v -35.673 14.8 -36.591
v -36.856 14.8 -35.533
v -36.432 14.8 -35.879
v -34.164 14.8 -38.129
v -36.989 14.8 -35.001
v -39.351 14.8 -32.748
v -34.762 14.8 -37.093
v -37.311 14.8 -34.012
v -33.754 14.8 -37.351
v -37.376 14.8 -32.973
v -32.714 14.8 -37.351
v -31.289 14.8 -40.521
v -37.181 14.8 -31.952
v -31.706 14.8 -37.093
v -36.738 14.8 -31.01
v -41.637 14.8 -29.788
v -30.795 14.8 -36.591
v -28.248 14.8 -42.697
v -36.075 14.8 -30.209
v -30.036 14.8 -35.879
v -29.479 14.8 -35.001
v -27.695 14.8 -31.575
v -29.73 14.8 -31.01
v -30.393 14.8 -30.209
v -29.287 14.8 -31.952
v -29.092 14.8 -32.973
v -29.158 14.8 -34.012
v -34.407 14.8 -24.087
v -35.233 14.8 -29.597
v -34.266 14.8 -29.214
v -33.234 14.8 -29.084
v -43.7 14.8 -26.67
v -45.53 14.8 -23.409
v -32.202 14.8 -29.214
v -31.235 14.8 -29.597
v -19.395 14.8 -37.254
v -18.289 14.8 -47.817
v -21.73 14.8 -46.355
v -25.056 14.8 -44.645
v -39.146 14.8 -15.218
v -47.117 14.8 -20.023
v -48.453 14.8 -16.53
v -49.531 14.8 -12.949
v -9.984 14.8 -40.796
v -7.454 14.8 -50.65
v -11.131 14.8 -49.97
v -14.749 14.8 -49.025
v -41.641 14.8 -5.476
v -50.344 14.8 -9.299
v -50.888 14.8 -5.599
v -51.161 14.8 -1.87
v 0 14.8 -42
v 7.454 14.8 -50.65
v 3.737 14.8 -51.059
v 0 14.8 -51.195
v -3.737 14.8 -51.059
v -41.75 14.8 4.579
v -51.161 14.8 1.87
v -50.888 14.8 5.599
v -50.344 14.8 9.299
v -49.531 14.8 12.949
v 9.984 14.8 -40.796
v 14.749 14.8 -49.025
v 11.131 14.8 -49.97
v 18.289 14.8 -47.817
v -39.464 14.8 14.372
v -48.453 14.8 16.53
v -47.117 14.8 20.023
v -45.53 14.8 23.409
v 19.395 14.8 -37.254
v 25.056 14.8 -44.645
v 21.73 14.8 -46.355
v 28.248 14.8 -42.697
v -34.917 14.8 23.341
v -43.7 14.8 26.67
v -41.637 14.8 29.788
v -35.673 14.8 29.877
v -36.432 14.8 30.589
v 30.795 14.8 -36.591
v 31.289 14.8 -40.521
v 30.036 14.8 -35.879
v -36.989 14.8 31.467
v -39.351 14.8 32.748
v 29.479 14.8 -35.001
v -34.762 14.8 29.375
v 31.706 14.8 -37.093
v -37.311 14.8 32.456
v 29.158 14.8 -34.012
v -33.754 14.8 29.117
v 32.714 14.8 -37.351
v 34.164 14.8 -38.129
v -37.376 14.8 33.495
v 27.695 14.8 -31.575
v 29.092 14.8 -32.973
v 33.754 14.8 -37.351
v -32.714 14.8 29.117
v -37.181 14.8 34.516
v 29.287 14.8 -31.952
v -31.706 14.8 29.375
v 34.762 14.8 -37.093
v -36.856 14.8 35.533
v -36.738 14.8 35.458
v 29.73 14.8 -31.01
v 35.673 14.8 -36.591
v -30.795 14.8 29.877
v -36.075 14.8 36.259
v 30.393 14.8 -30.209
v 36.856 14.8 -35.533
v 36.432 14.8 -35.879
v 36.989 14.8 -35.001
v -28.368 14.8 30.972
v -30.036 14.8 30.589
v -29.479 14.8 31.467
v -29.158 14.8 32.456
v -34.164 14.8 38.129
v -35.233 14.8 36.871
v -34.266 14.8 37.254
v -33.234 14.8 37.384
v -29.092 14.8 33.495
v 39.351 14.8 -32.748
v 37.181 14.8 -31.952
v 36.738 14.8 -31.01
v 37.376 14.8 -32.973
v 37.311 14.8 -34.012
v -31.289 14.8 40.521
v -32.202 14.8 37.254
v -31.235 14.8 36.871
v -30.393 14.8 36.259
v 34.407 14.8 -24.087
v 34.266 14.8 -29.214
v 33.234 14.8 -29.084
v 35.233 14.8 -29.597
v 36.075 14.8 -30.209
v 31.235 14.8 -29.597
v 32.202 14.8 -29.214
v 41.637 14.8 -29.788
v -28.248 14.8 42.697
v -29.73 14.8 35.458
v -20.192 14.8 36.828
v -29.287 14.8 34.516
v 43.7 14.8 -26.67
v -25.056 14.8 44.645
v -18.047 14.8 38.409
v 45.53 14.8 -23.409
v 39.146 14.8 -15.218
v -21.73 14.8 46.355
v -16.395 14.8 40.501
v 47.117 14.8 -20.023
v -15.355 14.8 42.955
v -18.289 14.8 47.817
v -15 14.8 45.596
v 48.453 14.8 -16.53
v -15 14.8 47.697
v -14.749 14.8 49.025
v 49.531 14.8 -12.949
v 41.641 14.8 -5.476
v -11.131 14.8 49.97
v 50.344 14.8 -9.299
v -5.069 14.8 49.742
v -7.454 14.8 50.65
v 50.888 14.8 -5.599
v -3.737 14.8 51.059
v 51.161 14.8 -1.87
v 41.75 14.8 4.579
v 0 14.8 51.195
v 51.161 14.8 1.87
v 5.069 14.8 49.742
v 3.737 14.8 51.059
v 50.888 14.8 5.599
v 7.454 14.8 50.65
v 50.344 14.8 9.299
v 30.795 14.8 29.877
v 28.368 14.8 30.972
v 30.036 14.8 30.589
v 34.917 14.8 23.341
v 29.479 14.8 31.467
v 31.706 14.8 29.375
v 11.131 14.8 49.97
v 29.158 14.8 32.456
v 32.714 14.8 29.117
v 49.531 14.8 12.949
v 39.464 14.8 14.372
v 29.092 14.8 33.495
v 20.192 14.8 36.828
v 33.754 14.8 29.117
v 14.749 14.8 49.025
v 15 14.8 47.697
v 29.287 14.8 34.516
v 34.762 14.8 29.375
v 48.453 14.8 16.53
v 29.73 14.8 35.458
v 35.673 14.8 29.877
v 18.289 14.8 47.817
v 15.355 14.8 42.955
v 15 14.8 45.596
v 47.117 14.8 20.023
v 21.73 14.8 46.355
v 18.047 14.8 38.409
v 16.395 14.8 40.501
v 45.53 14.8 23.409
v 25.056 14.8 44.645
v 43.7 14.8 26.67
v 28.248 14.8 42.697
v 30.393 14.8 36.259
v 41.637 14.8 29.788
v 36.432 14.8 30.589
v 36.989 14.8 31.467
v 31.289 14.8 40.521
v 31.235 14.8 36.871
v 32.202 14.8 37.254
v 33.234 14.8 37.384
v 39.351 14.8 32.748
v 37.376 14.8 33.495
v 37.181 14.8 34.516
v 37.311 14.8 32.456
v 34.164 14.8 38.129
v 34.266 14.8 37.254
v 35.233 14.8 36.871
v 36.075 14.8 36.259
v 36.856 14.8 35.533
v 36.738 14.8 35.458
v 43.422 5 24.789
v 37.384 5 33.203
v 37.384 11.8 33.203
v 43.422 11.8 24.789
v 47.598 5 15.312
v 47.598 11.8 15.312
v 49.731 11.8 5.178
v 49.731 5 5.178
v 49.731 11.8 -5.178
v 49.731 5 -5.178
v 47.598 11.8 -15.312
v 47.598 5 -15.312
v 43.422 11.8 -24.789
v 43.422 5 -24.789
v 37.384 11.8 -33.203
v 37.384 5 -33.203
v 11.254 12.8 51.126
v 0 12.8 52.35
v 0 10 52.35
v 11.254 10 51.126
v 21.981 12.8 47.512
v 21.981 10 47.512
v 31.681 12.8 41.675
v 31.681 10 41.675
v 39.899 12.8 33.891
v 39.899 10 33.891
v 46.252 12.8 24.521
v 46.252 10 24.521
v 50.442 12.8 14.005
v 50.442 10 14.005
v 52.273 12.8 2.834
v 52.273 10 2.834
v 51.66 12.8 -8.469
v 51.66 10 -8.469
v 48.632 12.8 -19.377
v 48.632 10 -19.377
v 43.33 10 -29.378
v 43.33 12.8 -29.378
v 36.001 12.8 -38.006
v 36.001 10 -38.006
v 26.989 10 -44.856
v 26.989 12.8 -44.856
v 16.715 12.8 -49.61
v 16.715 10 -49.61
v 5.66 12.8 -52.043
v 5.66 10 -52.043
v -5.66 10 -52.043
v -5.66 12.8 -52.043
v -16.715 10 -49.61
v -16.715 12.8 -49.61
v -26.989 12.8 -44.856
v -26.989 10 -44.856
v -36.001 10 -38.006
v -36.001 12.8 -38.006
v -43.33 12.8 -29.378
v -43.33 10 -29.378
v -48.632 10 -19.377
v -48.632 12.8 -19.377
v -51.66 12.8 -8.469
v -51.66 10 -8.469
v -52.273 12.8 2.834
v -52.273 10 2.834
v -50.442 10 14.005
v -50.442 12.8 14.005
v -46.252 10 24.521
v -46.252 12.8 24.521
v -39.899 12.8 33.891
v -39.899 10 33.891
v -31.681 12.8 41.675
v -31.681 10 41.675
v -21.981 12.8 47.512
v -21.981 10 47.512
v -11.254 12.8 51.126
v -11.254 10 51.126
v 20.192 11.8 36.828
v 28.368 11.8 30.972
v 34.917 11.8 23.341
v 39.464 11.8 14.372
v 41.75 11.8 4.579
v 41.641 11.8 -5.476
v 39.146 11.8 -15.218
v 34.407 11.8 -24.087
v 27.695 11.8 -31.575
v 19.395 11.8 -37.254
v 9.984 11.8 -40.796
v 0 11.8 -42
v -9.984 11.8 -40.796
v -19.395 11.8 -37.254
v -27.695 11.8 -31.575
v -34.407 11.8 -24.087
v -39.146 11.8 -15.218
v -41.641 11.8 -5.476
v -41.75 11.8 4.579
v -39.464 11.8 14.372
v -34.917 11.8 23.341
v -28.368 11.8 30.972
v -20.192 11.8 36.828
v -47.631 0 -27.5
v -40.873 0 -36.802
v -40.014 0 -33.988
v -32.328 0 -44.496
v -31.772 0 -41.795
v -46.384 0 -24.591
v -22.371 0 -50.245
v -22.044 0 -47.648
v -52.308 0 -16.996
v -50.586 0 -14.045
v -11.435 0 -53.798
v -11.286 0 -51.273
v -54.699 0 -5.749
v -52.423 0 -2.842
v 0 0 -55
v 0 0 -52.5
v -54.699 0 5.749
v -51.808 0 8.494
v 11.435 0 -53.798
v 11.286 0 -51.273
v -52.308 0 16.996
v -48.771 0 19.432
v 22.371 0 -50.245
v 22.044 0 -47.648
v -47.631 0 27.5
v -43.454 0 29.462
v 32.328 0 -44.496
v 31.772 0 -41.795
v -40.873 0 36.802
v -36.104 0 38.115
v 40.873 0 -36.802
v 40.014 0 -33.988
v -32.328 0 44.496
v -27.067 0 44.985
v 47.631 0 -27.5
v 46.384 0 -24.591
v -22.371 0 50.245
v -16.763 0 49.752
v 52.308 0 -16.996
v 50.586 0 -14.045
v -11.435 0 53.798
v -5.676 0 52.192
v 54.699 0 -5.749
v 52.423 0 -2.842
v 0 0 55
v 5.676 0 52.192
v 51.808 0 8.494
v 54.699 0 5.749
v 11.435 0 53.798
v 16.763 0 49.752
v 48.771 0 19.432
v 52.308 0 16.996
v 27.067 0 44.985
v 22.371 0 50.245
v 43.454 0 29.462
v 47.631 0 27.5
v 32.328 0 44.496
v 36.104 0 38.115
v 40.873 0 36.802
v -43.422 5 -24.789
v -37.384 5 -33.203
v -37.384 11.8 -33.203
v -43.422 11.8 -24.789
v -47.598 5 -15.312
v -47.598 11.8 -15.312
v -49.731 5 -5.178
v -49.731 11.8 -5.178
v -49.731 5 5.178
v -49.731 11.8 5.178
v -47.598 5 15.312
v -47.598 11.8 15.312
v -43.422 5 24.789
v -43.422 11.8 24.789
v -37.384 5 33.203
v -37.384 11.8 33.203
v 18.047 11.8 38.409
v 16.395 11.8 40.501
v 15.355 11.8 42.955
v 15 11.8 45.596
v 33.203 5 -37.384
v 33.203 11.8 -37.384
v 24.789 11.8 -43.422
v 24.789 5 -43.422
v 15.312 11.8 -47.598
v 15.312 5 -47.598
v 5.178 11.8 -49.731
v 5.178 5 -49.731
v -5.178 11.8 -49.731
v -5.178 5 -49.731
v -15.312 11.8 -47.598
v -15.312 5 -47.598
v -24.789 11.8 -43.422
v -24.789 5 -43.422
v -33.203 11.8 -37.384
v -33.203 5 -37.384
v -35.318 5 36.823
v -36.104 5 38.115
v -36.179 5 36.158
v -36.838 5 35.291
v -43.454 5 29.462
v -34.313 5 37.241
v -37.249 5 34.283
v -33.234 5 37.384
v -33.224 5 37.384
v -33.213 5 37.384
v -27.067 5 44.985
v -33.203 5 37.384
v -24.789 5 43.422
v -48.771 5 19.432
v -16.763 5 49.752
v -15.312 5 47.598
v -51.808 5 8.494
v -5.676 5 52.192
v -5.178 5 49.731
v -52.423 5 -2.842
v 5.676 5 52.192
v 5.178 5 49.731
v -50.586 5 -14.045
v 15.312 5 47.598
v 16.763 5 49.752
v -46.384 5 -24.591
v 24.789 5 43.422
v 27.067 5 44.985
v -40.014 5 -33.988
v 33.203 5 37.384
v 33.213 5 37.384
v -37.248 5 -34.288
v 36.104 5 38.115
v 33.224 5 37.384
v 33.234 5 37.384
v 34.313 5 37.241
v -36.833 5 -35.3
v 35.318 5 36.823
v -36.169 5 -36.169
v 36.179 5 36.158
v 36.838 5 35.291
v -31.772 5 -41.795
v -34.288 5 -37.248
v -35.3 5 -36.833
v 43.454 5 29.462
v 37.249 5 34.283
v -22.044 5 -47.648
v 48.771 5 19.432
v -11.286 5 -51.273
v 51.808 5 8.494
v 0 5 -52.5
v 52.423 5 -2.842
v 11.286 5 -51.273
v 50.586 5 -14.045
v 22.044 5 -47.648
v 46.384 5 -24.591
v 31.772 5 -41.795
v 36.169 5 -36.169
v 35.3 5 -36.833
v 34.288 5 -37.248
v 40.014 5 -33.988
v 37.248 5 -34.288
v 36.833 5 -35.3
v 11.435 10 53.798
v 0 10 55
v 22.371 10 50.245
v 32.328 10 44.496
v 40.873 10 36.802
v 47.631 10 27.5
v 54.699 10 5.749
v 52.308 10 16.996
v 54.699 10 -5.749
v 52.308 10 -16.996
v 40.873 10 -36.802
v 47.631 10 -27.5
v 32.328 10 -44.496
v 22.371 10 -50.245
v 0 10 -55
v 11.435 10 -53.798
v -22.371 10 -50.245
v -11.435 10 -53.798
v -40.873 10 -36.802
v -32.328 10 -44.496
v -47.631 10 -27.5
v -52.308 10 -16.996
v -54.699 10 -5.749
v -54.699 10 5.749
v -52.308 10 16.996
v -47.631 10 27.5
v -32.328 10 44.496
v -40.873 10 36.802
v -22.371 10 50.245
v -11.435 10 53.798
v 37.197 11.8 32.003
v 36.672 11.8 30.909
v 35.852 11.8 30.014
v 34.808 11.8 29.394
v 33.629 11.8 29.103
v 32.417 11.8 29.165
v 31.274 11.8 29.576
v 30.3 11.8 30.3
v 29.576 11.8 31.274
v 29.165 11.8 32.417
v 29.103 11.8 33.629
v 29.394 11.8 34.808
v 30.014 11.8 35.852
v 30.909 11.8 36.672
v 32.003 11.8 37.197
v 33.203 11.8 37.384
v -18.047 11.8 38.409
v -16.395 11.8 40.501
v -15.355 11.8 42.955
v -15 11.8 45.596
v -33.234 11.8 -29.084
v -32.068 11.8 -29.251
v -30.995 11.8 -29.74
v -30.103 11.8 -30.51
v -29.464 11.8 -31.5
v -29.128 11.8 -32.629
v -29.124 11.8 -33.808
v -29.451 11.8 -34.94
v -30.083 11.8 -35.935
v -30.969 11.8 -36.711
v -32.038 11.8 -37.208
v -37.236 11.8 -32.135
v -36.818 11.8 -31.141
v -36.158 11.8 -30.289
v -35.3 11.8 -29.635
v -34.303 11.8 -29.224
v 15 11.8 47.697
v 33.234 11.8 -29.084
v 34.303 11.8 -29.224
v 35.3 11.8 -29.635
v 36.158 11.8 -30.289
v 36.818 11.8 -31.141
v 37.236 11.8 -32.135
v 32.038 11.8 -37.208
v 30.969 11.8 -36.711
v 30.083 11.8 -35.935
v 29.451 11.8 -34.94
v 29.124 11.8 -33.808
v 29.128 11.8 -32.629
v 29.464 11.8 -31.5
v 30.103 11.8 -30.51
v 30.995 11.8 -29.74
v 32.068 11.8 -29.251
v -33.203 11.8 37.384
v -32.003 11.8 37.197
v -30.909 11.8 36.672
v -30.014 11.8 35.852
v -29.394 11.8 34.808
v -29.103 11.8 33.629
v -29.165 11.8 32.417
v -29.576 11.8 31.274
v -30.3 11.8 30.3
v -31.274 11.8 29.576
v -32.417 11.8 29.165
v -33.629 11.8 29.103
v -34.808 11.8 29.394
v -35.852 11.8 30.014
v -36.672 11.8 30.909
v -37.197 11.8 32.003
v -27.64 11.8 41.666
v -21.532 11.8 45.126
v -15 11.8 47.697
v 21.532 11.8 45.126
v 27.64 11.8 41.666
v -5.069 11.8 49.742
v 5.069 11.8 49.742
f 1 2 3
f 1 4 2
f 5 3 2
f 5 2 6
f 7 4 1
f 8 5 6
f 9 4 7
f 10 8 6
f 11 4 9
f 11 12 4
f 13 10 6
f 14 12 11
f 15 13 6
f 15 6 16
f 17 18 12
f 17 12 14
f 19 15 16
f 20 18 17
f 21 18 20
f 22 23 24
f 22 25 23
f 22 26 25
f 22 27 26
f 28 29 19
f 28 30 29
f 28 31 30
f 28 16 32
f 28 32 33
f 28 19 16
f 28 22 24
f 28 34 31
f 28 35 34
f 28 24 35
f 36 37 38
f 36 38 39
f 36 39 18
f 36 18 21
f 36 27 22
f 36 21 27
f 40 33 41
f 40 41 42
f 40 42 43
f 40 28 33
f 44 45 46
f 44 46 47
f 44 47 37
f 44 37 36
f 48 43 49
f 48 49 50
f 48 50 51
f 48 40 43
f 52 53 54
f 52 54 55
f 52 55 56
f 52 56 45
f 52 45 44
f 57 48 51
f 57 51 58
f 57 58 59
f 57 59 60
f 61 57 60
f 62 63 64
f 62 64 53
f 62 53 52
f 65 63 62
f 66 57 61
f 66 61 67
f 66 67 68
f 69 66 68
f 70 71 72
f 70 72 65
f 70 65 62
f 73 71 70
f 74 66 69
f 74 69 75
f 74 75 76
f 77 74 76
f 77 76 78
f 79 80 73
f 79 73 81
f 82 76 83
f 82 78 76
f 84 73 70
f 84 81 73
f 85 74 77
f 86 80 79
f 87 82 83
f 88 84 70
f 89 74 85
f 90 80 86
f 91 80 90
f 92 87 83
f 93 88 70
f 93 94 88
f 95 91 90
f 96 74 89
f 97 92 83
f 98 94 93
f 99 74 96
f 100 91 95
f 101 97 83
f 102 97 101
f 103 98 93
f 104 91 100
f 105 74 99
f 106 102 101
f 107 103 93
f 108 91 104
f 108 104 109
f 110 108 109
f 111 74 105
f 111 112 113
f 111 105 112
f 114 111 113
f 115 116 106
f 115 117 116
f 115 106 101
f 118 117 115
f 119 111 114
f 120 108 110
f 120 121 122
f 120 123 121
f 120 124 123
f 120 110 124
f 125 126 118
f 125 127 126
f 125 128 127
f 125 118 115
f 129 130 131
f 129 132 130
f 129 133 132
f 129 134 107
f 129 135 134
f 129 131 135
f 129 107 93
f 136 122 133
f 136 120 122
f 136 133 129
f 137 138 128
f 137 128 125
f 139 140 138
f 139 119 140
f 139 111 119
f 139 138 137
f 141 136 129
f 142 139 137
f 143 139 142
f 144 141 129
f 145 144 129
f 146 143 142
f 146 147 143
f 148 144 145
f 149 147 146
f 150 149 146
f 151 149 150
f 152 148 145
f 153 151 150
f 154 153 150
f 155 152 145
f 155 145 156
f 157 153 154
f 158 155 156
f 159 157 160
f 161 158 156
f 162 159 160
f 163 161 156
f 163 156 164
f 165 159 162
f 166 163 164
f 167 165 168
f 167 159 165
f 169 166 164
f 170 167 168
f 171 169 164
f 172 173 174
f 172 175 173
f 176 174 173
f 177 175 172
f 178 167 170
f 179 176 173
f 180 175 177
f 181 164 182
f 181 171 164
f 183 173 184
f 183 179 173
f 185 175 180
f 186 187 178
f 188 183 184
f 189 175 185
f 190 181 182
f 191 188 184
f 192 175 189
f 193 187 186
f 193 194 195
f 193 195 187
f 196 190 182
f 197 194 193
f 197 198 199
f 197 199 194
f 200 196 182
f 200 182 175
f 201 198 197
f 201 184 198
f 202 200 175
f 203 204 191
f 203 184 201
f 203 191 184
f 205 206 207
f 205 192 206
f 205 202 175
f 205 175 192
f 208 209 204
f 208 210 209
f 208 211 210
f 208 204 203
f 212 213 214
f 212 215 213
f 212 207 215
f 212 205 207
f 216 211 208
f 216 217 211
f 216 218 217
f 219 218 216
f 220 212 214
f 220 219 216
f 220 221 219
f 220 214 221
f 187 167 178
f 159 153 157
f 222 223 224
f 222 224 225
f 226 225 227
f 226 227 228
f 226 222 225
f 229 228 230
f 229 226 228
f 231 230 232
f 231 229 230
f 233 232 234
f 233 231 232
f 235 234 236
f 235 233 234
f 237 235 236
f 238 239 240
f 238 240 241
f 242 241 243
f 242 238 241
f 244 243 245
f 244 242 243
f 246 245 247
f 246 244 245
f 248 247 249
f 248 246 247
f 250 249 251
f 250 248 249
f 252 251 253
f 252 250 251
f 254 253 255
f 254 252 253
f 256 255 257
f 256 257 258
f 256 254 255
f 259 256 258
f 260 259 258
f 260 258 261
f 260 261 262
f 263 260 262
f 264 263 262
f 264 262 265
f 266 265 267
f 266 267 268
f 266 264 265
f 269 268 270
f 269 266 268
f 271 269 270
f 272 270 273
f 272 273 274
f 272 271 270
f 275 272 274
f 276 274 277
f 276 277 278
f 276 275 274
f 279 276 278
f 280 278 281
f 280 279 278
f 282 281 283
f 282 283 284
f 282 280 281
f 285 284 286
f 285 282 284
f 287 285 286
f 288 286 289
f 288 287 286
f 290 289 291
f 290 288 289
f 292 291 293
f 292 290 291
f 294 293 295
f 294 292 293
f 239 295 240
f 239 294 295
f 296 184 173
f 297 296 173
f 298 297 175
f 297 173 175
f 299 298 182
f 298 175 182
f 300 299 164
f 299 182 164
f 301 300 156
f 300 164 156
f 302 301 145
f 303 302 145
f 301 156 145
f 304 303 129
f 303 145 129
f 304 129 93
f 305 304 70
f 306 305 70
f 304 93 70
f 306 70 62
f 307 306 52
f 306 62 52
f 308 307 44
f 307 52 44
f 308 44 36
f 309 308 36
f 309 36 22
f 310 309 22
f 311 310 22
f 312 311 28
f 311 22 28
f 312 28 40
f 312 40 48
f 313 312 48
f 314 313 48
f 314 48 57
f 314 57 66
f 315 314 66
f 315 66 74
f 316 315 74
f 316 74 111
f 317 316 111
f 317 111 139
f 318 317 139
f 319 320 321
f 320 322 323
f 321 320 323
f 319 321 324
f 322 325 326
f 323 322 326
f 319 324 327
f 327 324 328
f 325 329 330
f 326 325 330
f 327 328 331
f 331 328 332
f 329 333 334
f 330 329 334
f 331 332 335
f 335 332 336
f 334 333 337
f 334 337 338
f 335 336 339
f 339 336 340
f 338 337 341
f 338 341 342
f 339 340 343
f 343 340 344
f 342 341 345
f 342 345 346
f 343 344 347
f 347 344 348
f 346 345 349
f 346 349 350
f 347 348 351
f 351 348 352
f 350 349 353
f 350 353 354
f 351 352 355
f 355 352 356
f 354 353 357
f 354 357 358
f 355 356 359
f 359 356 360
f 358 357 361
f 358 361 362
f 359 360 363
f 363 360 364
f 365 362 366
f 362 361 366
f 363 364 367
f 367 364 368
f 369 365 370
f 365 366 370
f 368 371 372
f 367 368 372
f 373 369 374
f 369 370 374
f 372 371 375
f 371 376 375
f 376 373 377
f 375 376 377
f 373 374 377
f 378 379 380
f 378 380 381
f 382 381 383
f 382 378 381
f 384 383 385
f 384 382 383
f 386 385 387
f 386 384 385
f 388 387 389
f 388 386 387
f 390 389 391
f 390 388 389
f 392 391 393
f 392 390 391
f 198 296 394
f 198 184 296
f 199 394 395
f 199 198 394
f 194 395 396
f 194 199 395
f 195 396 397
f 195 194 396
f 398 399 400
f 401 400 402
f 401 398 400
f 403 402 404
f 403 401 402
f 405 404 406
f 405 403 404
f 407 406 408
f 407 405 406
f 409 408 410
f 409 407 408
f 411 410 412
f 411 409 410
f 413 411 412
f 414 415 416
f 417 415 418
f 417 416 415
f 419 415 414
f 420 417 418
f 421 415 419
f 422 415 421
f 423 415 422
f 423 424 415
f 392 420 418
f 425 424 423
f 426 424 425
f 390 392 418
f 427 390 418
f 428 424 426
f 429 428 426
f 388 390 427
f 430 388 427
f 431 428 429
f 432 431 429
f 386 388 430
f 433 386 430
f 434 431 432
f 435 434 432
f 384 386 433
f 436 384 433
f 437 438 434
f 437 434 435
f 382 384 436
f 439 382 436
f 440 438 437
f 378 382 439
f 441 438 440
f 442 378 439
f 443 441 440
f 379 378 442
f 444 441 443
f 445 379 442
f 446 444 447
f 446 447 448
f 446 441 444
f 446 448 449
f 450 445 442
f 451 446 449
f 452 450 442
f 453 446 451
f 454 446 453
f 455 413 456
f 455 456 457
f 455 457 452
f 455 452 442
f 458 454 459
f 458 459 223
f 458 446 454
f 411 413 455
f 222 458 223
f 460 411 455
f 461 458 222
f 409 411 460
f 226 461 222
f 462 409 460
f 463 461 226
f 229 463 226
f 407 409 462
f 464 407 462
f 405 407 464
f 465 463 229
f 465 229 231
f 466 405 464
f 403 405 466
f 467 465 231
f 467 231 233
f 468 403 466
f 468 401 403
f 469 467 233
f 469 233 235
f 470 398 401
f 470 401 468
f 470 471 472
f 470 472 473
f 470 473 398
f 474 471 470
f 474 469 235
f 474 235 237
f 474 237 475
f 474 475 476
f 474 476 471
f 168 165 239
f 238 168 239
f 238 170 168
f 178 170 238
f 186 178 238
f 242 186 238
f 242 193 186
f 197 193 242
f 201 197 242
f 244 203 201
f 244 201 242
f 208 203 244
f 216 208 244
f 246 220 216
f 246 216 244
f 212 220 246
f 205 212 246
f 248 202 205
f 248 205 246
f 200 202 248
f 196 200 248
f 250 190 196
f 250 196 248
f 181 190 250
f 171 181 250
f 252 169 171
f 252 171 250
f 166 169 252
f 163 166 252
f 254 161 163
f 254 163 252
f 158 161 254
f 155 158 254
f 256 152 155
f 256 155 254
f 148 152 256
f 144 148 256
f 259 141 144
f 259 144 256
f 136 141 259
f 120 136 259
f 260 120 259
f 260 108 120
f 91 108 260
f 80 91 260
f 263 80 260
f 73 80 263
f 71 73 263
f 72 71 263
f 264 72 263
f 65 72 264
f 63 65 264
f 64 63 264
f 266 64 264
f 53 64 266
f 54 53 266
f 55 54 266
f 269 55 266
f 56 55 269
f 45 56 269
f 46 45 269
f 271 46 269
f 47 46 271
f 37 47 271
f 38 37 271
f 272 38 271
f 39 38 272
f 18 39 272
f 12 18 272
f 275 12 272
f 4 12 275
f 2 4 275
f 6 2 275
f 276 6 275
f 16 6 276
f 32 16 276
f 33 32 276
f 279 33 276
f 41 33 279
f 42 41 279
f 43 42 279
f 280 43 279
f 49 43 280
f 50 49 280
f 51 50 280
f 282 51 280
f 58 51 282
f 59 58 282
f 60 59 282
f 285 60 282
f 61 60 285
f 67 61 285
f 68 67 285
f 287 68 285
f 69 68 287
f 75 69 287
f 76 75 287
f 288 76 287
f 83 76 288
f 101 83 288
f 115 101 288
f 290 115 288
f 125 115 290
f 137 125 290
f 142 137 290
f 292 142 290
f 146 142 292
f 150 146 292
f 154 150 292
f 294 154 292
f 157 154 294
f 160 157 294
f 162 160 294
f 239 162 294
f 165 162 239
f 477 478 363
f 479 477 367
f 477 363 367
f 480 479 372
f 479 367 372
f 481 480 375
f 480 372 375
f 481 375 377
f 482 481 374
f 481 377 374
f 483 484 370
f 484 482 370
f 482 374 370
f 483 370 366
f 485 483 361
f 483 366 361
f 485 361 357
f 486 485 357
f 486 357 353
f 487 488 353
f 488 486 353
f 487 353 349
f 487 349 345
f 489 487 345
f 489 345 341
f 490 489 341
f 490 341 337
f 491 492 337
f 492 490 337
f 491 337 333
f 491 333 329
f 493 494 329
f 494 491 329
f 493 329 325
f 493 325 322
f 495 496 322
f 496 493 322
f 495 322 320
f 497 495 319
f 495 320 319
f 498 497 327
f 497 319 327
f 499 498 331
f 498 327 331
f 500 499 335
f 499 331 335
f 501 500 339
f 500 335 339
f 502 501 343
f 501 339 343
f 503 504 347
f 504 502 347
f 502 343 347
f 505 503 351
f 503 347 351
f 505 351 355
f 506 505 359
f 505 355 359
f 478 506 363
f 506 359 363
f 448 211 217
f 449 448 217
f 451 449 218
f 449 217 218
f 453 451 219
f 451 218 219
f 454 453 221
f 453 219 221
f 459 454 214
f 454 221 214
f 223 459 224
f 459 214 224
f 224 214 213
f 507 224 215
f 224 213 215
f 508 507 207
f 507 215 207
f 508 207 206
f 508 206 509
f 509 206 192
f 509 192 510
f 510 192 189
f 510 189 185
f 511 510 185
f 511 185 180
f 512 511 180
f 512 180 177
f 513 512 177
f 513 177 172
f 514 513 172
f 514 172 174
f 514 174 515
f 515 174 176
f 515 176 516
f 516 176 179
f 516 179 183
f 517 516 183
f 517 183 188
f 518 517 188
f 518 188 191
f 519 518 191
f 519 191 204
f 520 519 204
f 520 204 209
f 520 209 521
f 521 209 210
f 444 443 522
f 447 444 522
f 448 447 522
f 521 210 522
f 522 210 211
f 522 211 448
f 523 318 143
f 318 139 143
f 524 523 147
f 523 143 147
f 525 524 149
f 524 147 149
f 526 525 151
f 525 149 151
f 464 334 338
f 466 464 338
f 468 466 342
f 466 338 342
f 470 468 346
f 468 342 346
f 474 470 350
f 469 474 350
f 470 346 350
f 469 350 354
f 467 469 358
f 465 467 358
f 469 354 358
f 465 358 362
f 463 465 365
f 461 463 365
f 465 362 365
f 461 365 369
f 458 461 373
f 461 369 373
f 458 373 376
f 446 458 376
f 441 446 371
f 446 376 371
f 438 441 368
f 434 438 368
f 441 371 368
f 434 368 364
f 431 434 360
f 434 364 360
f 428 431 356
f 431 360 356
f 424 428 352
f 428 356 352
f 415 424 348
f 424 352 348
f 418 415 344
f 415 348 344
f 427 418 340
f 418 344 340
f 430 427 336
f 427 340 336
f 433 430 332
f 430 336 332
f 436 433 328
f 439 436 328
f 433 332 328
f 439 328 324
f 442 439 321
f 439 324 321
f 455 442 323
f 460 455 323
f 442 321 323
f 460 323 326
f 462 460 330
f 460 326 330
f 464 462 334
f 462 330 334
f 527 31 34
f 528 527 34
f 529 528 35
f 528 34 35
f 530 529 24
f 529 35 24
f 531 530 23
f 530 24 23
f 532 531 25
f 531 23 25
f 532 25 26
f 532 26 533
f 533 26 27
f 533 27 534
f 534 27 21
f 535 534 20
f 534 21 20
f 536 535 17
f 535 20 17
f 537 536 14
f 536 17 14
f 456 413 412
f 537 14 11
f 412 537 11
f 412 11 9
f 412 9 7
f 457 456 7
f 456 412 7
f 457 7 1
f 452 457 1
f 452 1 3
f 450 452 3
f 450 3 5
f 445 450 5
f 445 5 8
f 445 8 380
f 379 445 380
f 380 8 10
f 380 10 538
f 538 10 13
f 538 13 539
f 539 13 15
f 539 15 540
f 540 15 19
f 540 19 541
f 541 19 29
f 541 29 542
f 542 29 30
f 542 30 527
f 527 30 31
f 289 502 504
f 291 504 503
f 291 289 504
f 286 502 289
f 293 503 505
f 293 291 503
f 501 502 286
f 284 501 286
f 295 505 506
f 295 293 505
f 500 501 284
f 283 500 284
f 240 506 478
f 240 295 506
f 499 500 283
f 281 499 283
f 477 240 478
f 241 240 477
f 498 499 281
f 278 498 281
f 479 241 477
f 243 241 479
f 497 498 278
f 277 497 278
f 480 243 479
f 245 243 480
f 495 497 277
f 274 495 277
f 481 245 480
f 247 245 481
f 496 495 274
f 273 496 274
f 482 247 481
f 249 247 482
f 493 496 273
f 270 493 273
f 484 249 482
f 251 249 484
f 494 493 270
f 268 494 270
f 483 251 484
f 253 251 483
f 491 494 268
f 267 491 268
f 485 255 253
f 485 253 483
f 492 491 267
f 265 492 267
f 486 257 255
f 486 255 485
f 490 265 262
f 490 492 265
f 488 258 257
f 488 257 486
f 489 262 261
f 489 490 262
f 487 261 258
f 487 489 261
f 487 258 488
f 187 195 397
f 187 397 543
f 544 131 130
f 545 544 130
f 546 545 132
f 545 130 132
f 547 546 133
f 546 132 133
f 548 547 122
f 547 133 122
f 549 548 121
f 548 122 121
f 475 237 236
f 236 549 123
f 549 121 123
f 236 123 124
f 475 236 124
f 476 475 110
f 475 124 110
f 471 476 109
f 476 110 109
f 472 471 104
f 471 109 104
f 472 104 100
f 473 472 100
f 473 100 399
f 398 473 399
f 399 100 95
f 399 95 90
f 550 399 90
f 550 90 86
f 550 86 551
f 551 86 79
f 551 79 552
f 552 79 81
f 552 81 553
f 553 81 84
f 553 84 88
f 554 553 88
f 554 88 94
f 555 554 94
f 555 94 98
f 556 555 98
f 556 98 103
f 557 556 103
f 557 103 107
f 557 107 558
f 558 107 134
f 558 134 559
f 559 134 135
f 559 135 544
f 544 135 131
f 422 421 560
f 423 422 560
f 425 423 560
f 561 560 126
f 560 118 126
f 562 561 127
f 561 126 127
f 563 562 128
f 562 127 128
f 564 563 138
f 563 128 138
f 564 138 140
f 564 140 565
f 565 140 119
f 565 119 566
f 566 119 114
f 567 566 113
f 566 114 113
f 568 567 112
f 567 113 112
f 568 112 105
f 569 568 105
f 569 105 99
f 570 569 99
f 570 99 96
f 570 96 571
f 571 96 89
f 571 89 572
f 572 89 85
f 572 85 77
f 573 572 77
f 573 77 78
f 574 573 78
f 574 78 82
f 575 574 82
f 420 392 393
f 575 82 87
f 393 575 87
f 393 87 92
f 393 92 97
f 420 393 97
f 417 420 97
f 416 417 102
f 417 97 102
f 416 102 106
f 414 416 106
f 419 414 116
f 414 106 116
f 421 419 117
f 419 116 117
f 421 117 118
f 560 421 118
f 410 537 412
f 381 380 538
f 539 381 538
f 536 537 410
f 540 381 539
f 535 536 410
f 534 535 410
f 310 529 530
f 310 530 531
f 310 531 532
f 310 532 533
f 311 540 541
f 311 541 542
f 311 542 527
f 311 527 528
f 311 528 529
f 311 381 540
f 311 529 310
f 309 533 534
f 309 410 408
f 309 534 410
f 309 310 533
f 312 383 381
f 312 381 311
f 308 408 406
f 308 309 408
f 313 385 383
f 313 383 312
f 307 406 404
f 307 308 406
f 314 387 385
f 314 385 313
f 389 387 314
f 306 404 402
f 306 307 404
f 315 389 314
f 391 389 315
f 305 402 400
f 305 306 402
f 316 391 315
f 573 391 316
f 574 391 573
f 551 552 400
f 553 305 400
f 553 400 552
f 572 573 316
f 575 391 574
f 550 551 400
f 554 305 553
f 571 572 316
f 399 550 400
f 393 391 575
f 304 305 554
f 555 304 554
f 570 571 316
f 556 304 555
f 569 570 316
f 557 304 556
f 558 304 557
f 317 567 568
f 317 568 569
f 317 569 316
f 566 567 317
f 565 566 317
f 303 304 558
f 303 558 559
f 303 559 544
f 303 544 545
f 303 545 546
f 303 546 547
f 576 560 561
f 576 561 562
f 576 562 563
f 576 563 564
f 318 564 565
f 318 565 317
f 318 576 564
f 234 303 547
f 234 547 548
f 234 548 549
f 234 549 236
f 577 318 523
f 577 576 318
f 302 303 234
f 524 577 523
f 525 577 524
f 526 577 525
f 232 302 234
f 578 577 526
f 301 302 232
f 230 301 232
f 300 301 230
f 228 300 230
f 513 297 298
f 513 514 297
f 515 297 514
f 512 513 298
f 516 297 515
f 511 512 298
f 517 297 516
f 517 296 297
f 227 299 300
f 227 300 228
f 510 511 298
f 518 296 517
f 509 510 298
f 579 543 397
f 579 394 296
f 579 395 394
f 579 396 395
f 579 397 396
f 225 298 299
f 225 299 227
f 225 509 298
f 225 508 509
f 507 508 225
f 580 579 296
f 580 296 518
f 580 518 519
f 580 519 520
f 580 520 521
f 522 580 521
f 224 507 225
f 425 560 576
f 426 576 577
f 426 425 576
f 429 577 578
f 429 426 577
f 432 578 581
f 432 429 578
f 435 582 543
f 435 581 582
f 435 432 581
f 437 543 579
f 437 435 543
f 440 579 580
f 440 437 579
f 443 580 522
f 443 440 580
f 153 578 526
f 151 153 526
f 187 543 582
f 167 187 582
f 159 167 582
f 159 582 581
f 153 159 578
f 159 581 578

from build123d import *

# Parameters (mm, degrees)
SKETCH1_R           = 55
BOSS_EXTRUDE1_DEPTH = 14.8
SHELL1_T            = -5
SKETCH2_R           = 35
CUT_EXTRUDE1_DEPTH  = 6
SKETCH3_R           = 42
CUT_EXTRUDE2_DEPTH  = 15.8
SKETCH4_R           = 4.15
CUT_EXTRUDE3_DEPTH  = 15.8
SKETCH6_R           = 50
CUT_EXTRUDE4_DEPTH  = 2
CUT_EXTRUDE5_DEPTH  = 4
FILLET1_R           = 10
SKETCH8_OUTSIDE_W   = 143.254
SKETCH8_OUTSIDE_H   = 143.254
SKETCH8_OUTSIDE_R   = 52.35
CUT_EXTRUDE6_DEPTH  = 4.8
CHAMFER1_SIZE       = 2
CHAMFER1_SIZE2      = 1.154700538
SKETCH9_R           = 52.5
CUT_EXTRUDE7_DEPTH  = 5


with BuildPart() as part:
    # Sketch1 → Boss-Extrude1 (new body)
    with BuildSketch(Plane(origin=(0, 0, 0), x_dir=(1, 0, 0), z_dir=(0, 1, 0))):
        with Locations(Location((0, 0, 0), (0, 0, 270))):  # turned: the seam where the file's is
            Circle(SKETCH1_R)
    extrude(amount=BOSS_EXTRUDE1_DEPTH)

    # Shell1
    shell1_openings = [part.faces().sort_by_distance(p)[0] for p in [
        (0, 0, 0),
    ]]
    offset(amount=SHELL1_T, openings=shell1_openings, kind=Kind.INTERSECTION)

    # Sketch2 → Cut-Extrude1 (cut, through all)
    with BuildSketch(Plane.XZ.offset(-9.8)):
        with Locations(Location((0, 0, 0), (0, 0, 270))):  # turned: the seam where the file's is
            Circle(SKETCH2_R)
    extrude(amount=-CUT_EXTRUDE1_DEPTH, mode=Mode.SUBTRACT)

    # Sketch3 → Cut-Extrude2 (cut, through all)
    with BuildSketch(Plane(origin=(0, 14.8, 0), x_dir=(1, 0, 0), z_dir=(0, 1, 0))):
        with Locations(Location((0, 0, 0), (0, 0, 270))):  # turned: the seam where the file's is
            Circle(SKETCH3_R)
    extrude(amount=-CUT_EXTRUDE2_DEPTH, mode=Mode.SUBTRACT)

    # Sketch4 → Cut-Extrude3 (cut, through all)
    with BuildSketch(Plane(origin=(0, 14.8, 0), x_dir=(1, 0, 0), z_dir=(0, 1, 0))):
        with Locations(Location((-33.234018716, -33.234018716, 0), (0, 0, 270))):  # turned: the seam where the file's is
            Circle(SKETCH4_R)
        with Locations(Location((-33.234018716, 33.234018716, 0), (0, 0, 270))):  # turned: the seam where the file's is
            Circle(SKETCH4_R)
        with Locations(Location((33.234018716, 33.234018716, 0), (0, 0, 270))):  # turned: the seam where the file's is
            Circle(SKETCH4_R)
        with Locations(Location((33.234018716, -33.234018716, 0), (0, 0, 270))):  # turned: the seam where the file's is
            Circle(SKETCH4_R)
    extrude(amount=-CUT_EXTRUDE3_DEPTH, mode=Mode.SUBTRACT)

    # Sketch6 → Cut-Extrude4 (cut)
    with BuildSketch(Plane.XZ.offset(-9.8)):
        Circle(SKETCH6_R)
    extrude(amount=-CUT_EXTRUDE4_DEPTH, mode=Mode.SUBTRACT)

    # Sketch7 → Cut-Extrude5 (cut, through all)
    with BuildSketch(Plane.XZ.offset(-11.8)):
        with BuildLine():
            Line((15, 33.234018716), (15, 47.696960071))
            ThreePointArc((15, 47.696960071), (0, 50), (-15, 47.696960071))
            Line((-15, 47.696960071), (-15, 33.234018716))
            Line((-15, 33.234018716), (15, 33.234018716))
        make_face()
    extrude(amount=-CUT_EXTRUDE5_DEPTH, mode=Mode.SUBTRACT)

    # Fillet1
    fillet1_edges = [part.edges().sort_by_distance(p)[0] for p in [
        (-15, 13.3, 39.230090492),
        (15, 13.3, 39.230090492),
    ]]
    fillet(fillet1_edges, radius=FILLET1_R)

    # Sketch8 outside → Cut-Extrude6 (cut)
    with BuildSketch(Plane(origin=(0, 14.8, 0), x_dir=(1, 0, 0), z_dir=(0, 1, 0))):
        Rectangle(SKETCH8_OUTSIDE_W, SKETCH8_OUTSIDE_H)
        with Locations(Location((0, 0, 0), (0, 0, 270))):  # turned: the seam where the file's is
            Circle(SKETCH8_OUTSIDE_R, mode=Mode.SUBTRACT)
    extrude(amount=-CUT_EXTRUDE6_DEPTH, mode=Mode.SUBTRACT)

    # Chamfer1
    chamfer1_edges = [part.edges().sort_by_distance(p)[0] for p in [
        (0, 14.8, -52.35),
    ]]
    chamfer1_side = [part.faces().sort_by_distance(p)[0] for p in [
        (0, 12.4, -52.35),
    ]]
    chamfer(chamfer1_edges, length=CHAMFER1_SIZE, length2=CHAMFER1_SIZE2, reference=chamfer1_side[0])

    # Sketch9 → Cut-Extrude7 (cut)
    with BuildSketch(Plane.XZ):
        with Locations(Location((0, 0, 0), (0, 0, 270))):  # turned: the seam where the file's is
            Circle(SKETCH9_R)
    extrude(amount=-CUT_EXTRUDE7_DEPTH, mode=Mode.SUBTRACT)


solid = part.part
